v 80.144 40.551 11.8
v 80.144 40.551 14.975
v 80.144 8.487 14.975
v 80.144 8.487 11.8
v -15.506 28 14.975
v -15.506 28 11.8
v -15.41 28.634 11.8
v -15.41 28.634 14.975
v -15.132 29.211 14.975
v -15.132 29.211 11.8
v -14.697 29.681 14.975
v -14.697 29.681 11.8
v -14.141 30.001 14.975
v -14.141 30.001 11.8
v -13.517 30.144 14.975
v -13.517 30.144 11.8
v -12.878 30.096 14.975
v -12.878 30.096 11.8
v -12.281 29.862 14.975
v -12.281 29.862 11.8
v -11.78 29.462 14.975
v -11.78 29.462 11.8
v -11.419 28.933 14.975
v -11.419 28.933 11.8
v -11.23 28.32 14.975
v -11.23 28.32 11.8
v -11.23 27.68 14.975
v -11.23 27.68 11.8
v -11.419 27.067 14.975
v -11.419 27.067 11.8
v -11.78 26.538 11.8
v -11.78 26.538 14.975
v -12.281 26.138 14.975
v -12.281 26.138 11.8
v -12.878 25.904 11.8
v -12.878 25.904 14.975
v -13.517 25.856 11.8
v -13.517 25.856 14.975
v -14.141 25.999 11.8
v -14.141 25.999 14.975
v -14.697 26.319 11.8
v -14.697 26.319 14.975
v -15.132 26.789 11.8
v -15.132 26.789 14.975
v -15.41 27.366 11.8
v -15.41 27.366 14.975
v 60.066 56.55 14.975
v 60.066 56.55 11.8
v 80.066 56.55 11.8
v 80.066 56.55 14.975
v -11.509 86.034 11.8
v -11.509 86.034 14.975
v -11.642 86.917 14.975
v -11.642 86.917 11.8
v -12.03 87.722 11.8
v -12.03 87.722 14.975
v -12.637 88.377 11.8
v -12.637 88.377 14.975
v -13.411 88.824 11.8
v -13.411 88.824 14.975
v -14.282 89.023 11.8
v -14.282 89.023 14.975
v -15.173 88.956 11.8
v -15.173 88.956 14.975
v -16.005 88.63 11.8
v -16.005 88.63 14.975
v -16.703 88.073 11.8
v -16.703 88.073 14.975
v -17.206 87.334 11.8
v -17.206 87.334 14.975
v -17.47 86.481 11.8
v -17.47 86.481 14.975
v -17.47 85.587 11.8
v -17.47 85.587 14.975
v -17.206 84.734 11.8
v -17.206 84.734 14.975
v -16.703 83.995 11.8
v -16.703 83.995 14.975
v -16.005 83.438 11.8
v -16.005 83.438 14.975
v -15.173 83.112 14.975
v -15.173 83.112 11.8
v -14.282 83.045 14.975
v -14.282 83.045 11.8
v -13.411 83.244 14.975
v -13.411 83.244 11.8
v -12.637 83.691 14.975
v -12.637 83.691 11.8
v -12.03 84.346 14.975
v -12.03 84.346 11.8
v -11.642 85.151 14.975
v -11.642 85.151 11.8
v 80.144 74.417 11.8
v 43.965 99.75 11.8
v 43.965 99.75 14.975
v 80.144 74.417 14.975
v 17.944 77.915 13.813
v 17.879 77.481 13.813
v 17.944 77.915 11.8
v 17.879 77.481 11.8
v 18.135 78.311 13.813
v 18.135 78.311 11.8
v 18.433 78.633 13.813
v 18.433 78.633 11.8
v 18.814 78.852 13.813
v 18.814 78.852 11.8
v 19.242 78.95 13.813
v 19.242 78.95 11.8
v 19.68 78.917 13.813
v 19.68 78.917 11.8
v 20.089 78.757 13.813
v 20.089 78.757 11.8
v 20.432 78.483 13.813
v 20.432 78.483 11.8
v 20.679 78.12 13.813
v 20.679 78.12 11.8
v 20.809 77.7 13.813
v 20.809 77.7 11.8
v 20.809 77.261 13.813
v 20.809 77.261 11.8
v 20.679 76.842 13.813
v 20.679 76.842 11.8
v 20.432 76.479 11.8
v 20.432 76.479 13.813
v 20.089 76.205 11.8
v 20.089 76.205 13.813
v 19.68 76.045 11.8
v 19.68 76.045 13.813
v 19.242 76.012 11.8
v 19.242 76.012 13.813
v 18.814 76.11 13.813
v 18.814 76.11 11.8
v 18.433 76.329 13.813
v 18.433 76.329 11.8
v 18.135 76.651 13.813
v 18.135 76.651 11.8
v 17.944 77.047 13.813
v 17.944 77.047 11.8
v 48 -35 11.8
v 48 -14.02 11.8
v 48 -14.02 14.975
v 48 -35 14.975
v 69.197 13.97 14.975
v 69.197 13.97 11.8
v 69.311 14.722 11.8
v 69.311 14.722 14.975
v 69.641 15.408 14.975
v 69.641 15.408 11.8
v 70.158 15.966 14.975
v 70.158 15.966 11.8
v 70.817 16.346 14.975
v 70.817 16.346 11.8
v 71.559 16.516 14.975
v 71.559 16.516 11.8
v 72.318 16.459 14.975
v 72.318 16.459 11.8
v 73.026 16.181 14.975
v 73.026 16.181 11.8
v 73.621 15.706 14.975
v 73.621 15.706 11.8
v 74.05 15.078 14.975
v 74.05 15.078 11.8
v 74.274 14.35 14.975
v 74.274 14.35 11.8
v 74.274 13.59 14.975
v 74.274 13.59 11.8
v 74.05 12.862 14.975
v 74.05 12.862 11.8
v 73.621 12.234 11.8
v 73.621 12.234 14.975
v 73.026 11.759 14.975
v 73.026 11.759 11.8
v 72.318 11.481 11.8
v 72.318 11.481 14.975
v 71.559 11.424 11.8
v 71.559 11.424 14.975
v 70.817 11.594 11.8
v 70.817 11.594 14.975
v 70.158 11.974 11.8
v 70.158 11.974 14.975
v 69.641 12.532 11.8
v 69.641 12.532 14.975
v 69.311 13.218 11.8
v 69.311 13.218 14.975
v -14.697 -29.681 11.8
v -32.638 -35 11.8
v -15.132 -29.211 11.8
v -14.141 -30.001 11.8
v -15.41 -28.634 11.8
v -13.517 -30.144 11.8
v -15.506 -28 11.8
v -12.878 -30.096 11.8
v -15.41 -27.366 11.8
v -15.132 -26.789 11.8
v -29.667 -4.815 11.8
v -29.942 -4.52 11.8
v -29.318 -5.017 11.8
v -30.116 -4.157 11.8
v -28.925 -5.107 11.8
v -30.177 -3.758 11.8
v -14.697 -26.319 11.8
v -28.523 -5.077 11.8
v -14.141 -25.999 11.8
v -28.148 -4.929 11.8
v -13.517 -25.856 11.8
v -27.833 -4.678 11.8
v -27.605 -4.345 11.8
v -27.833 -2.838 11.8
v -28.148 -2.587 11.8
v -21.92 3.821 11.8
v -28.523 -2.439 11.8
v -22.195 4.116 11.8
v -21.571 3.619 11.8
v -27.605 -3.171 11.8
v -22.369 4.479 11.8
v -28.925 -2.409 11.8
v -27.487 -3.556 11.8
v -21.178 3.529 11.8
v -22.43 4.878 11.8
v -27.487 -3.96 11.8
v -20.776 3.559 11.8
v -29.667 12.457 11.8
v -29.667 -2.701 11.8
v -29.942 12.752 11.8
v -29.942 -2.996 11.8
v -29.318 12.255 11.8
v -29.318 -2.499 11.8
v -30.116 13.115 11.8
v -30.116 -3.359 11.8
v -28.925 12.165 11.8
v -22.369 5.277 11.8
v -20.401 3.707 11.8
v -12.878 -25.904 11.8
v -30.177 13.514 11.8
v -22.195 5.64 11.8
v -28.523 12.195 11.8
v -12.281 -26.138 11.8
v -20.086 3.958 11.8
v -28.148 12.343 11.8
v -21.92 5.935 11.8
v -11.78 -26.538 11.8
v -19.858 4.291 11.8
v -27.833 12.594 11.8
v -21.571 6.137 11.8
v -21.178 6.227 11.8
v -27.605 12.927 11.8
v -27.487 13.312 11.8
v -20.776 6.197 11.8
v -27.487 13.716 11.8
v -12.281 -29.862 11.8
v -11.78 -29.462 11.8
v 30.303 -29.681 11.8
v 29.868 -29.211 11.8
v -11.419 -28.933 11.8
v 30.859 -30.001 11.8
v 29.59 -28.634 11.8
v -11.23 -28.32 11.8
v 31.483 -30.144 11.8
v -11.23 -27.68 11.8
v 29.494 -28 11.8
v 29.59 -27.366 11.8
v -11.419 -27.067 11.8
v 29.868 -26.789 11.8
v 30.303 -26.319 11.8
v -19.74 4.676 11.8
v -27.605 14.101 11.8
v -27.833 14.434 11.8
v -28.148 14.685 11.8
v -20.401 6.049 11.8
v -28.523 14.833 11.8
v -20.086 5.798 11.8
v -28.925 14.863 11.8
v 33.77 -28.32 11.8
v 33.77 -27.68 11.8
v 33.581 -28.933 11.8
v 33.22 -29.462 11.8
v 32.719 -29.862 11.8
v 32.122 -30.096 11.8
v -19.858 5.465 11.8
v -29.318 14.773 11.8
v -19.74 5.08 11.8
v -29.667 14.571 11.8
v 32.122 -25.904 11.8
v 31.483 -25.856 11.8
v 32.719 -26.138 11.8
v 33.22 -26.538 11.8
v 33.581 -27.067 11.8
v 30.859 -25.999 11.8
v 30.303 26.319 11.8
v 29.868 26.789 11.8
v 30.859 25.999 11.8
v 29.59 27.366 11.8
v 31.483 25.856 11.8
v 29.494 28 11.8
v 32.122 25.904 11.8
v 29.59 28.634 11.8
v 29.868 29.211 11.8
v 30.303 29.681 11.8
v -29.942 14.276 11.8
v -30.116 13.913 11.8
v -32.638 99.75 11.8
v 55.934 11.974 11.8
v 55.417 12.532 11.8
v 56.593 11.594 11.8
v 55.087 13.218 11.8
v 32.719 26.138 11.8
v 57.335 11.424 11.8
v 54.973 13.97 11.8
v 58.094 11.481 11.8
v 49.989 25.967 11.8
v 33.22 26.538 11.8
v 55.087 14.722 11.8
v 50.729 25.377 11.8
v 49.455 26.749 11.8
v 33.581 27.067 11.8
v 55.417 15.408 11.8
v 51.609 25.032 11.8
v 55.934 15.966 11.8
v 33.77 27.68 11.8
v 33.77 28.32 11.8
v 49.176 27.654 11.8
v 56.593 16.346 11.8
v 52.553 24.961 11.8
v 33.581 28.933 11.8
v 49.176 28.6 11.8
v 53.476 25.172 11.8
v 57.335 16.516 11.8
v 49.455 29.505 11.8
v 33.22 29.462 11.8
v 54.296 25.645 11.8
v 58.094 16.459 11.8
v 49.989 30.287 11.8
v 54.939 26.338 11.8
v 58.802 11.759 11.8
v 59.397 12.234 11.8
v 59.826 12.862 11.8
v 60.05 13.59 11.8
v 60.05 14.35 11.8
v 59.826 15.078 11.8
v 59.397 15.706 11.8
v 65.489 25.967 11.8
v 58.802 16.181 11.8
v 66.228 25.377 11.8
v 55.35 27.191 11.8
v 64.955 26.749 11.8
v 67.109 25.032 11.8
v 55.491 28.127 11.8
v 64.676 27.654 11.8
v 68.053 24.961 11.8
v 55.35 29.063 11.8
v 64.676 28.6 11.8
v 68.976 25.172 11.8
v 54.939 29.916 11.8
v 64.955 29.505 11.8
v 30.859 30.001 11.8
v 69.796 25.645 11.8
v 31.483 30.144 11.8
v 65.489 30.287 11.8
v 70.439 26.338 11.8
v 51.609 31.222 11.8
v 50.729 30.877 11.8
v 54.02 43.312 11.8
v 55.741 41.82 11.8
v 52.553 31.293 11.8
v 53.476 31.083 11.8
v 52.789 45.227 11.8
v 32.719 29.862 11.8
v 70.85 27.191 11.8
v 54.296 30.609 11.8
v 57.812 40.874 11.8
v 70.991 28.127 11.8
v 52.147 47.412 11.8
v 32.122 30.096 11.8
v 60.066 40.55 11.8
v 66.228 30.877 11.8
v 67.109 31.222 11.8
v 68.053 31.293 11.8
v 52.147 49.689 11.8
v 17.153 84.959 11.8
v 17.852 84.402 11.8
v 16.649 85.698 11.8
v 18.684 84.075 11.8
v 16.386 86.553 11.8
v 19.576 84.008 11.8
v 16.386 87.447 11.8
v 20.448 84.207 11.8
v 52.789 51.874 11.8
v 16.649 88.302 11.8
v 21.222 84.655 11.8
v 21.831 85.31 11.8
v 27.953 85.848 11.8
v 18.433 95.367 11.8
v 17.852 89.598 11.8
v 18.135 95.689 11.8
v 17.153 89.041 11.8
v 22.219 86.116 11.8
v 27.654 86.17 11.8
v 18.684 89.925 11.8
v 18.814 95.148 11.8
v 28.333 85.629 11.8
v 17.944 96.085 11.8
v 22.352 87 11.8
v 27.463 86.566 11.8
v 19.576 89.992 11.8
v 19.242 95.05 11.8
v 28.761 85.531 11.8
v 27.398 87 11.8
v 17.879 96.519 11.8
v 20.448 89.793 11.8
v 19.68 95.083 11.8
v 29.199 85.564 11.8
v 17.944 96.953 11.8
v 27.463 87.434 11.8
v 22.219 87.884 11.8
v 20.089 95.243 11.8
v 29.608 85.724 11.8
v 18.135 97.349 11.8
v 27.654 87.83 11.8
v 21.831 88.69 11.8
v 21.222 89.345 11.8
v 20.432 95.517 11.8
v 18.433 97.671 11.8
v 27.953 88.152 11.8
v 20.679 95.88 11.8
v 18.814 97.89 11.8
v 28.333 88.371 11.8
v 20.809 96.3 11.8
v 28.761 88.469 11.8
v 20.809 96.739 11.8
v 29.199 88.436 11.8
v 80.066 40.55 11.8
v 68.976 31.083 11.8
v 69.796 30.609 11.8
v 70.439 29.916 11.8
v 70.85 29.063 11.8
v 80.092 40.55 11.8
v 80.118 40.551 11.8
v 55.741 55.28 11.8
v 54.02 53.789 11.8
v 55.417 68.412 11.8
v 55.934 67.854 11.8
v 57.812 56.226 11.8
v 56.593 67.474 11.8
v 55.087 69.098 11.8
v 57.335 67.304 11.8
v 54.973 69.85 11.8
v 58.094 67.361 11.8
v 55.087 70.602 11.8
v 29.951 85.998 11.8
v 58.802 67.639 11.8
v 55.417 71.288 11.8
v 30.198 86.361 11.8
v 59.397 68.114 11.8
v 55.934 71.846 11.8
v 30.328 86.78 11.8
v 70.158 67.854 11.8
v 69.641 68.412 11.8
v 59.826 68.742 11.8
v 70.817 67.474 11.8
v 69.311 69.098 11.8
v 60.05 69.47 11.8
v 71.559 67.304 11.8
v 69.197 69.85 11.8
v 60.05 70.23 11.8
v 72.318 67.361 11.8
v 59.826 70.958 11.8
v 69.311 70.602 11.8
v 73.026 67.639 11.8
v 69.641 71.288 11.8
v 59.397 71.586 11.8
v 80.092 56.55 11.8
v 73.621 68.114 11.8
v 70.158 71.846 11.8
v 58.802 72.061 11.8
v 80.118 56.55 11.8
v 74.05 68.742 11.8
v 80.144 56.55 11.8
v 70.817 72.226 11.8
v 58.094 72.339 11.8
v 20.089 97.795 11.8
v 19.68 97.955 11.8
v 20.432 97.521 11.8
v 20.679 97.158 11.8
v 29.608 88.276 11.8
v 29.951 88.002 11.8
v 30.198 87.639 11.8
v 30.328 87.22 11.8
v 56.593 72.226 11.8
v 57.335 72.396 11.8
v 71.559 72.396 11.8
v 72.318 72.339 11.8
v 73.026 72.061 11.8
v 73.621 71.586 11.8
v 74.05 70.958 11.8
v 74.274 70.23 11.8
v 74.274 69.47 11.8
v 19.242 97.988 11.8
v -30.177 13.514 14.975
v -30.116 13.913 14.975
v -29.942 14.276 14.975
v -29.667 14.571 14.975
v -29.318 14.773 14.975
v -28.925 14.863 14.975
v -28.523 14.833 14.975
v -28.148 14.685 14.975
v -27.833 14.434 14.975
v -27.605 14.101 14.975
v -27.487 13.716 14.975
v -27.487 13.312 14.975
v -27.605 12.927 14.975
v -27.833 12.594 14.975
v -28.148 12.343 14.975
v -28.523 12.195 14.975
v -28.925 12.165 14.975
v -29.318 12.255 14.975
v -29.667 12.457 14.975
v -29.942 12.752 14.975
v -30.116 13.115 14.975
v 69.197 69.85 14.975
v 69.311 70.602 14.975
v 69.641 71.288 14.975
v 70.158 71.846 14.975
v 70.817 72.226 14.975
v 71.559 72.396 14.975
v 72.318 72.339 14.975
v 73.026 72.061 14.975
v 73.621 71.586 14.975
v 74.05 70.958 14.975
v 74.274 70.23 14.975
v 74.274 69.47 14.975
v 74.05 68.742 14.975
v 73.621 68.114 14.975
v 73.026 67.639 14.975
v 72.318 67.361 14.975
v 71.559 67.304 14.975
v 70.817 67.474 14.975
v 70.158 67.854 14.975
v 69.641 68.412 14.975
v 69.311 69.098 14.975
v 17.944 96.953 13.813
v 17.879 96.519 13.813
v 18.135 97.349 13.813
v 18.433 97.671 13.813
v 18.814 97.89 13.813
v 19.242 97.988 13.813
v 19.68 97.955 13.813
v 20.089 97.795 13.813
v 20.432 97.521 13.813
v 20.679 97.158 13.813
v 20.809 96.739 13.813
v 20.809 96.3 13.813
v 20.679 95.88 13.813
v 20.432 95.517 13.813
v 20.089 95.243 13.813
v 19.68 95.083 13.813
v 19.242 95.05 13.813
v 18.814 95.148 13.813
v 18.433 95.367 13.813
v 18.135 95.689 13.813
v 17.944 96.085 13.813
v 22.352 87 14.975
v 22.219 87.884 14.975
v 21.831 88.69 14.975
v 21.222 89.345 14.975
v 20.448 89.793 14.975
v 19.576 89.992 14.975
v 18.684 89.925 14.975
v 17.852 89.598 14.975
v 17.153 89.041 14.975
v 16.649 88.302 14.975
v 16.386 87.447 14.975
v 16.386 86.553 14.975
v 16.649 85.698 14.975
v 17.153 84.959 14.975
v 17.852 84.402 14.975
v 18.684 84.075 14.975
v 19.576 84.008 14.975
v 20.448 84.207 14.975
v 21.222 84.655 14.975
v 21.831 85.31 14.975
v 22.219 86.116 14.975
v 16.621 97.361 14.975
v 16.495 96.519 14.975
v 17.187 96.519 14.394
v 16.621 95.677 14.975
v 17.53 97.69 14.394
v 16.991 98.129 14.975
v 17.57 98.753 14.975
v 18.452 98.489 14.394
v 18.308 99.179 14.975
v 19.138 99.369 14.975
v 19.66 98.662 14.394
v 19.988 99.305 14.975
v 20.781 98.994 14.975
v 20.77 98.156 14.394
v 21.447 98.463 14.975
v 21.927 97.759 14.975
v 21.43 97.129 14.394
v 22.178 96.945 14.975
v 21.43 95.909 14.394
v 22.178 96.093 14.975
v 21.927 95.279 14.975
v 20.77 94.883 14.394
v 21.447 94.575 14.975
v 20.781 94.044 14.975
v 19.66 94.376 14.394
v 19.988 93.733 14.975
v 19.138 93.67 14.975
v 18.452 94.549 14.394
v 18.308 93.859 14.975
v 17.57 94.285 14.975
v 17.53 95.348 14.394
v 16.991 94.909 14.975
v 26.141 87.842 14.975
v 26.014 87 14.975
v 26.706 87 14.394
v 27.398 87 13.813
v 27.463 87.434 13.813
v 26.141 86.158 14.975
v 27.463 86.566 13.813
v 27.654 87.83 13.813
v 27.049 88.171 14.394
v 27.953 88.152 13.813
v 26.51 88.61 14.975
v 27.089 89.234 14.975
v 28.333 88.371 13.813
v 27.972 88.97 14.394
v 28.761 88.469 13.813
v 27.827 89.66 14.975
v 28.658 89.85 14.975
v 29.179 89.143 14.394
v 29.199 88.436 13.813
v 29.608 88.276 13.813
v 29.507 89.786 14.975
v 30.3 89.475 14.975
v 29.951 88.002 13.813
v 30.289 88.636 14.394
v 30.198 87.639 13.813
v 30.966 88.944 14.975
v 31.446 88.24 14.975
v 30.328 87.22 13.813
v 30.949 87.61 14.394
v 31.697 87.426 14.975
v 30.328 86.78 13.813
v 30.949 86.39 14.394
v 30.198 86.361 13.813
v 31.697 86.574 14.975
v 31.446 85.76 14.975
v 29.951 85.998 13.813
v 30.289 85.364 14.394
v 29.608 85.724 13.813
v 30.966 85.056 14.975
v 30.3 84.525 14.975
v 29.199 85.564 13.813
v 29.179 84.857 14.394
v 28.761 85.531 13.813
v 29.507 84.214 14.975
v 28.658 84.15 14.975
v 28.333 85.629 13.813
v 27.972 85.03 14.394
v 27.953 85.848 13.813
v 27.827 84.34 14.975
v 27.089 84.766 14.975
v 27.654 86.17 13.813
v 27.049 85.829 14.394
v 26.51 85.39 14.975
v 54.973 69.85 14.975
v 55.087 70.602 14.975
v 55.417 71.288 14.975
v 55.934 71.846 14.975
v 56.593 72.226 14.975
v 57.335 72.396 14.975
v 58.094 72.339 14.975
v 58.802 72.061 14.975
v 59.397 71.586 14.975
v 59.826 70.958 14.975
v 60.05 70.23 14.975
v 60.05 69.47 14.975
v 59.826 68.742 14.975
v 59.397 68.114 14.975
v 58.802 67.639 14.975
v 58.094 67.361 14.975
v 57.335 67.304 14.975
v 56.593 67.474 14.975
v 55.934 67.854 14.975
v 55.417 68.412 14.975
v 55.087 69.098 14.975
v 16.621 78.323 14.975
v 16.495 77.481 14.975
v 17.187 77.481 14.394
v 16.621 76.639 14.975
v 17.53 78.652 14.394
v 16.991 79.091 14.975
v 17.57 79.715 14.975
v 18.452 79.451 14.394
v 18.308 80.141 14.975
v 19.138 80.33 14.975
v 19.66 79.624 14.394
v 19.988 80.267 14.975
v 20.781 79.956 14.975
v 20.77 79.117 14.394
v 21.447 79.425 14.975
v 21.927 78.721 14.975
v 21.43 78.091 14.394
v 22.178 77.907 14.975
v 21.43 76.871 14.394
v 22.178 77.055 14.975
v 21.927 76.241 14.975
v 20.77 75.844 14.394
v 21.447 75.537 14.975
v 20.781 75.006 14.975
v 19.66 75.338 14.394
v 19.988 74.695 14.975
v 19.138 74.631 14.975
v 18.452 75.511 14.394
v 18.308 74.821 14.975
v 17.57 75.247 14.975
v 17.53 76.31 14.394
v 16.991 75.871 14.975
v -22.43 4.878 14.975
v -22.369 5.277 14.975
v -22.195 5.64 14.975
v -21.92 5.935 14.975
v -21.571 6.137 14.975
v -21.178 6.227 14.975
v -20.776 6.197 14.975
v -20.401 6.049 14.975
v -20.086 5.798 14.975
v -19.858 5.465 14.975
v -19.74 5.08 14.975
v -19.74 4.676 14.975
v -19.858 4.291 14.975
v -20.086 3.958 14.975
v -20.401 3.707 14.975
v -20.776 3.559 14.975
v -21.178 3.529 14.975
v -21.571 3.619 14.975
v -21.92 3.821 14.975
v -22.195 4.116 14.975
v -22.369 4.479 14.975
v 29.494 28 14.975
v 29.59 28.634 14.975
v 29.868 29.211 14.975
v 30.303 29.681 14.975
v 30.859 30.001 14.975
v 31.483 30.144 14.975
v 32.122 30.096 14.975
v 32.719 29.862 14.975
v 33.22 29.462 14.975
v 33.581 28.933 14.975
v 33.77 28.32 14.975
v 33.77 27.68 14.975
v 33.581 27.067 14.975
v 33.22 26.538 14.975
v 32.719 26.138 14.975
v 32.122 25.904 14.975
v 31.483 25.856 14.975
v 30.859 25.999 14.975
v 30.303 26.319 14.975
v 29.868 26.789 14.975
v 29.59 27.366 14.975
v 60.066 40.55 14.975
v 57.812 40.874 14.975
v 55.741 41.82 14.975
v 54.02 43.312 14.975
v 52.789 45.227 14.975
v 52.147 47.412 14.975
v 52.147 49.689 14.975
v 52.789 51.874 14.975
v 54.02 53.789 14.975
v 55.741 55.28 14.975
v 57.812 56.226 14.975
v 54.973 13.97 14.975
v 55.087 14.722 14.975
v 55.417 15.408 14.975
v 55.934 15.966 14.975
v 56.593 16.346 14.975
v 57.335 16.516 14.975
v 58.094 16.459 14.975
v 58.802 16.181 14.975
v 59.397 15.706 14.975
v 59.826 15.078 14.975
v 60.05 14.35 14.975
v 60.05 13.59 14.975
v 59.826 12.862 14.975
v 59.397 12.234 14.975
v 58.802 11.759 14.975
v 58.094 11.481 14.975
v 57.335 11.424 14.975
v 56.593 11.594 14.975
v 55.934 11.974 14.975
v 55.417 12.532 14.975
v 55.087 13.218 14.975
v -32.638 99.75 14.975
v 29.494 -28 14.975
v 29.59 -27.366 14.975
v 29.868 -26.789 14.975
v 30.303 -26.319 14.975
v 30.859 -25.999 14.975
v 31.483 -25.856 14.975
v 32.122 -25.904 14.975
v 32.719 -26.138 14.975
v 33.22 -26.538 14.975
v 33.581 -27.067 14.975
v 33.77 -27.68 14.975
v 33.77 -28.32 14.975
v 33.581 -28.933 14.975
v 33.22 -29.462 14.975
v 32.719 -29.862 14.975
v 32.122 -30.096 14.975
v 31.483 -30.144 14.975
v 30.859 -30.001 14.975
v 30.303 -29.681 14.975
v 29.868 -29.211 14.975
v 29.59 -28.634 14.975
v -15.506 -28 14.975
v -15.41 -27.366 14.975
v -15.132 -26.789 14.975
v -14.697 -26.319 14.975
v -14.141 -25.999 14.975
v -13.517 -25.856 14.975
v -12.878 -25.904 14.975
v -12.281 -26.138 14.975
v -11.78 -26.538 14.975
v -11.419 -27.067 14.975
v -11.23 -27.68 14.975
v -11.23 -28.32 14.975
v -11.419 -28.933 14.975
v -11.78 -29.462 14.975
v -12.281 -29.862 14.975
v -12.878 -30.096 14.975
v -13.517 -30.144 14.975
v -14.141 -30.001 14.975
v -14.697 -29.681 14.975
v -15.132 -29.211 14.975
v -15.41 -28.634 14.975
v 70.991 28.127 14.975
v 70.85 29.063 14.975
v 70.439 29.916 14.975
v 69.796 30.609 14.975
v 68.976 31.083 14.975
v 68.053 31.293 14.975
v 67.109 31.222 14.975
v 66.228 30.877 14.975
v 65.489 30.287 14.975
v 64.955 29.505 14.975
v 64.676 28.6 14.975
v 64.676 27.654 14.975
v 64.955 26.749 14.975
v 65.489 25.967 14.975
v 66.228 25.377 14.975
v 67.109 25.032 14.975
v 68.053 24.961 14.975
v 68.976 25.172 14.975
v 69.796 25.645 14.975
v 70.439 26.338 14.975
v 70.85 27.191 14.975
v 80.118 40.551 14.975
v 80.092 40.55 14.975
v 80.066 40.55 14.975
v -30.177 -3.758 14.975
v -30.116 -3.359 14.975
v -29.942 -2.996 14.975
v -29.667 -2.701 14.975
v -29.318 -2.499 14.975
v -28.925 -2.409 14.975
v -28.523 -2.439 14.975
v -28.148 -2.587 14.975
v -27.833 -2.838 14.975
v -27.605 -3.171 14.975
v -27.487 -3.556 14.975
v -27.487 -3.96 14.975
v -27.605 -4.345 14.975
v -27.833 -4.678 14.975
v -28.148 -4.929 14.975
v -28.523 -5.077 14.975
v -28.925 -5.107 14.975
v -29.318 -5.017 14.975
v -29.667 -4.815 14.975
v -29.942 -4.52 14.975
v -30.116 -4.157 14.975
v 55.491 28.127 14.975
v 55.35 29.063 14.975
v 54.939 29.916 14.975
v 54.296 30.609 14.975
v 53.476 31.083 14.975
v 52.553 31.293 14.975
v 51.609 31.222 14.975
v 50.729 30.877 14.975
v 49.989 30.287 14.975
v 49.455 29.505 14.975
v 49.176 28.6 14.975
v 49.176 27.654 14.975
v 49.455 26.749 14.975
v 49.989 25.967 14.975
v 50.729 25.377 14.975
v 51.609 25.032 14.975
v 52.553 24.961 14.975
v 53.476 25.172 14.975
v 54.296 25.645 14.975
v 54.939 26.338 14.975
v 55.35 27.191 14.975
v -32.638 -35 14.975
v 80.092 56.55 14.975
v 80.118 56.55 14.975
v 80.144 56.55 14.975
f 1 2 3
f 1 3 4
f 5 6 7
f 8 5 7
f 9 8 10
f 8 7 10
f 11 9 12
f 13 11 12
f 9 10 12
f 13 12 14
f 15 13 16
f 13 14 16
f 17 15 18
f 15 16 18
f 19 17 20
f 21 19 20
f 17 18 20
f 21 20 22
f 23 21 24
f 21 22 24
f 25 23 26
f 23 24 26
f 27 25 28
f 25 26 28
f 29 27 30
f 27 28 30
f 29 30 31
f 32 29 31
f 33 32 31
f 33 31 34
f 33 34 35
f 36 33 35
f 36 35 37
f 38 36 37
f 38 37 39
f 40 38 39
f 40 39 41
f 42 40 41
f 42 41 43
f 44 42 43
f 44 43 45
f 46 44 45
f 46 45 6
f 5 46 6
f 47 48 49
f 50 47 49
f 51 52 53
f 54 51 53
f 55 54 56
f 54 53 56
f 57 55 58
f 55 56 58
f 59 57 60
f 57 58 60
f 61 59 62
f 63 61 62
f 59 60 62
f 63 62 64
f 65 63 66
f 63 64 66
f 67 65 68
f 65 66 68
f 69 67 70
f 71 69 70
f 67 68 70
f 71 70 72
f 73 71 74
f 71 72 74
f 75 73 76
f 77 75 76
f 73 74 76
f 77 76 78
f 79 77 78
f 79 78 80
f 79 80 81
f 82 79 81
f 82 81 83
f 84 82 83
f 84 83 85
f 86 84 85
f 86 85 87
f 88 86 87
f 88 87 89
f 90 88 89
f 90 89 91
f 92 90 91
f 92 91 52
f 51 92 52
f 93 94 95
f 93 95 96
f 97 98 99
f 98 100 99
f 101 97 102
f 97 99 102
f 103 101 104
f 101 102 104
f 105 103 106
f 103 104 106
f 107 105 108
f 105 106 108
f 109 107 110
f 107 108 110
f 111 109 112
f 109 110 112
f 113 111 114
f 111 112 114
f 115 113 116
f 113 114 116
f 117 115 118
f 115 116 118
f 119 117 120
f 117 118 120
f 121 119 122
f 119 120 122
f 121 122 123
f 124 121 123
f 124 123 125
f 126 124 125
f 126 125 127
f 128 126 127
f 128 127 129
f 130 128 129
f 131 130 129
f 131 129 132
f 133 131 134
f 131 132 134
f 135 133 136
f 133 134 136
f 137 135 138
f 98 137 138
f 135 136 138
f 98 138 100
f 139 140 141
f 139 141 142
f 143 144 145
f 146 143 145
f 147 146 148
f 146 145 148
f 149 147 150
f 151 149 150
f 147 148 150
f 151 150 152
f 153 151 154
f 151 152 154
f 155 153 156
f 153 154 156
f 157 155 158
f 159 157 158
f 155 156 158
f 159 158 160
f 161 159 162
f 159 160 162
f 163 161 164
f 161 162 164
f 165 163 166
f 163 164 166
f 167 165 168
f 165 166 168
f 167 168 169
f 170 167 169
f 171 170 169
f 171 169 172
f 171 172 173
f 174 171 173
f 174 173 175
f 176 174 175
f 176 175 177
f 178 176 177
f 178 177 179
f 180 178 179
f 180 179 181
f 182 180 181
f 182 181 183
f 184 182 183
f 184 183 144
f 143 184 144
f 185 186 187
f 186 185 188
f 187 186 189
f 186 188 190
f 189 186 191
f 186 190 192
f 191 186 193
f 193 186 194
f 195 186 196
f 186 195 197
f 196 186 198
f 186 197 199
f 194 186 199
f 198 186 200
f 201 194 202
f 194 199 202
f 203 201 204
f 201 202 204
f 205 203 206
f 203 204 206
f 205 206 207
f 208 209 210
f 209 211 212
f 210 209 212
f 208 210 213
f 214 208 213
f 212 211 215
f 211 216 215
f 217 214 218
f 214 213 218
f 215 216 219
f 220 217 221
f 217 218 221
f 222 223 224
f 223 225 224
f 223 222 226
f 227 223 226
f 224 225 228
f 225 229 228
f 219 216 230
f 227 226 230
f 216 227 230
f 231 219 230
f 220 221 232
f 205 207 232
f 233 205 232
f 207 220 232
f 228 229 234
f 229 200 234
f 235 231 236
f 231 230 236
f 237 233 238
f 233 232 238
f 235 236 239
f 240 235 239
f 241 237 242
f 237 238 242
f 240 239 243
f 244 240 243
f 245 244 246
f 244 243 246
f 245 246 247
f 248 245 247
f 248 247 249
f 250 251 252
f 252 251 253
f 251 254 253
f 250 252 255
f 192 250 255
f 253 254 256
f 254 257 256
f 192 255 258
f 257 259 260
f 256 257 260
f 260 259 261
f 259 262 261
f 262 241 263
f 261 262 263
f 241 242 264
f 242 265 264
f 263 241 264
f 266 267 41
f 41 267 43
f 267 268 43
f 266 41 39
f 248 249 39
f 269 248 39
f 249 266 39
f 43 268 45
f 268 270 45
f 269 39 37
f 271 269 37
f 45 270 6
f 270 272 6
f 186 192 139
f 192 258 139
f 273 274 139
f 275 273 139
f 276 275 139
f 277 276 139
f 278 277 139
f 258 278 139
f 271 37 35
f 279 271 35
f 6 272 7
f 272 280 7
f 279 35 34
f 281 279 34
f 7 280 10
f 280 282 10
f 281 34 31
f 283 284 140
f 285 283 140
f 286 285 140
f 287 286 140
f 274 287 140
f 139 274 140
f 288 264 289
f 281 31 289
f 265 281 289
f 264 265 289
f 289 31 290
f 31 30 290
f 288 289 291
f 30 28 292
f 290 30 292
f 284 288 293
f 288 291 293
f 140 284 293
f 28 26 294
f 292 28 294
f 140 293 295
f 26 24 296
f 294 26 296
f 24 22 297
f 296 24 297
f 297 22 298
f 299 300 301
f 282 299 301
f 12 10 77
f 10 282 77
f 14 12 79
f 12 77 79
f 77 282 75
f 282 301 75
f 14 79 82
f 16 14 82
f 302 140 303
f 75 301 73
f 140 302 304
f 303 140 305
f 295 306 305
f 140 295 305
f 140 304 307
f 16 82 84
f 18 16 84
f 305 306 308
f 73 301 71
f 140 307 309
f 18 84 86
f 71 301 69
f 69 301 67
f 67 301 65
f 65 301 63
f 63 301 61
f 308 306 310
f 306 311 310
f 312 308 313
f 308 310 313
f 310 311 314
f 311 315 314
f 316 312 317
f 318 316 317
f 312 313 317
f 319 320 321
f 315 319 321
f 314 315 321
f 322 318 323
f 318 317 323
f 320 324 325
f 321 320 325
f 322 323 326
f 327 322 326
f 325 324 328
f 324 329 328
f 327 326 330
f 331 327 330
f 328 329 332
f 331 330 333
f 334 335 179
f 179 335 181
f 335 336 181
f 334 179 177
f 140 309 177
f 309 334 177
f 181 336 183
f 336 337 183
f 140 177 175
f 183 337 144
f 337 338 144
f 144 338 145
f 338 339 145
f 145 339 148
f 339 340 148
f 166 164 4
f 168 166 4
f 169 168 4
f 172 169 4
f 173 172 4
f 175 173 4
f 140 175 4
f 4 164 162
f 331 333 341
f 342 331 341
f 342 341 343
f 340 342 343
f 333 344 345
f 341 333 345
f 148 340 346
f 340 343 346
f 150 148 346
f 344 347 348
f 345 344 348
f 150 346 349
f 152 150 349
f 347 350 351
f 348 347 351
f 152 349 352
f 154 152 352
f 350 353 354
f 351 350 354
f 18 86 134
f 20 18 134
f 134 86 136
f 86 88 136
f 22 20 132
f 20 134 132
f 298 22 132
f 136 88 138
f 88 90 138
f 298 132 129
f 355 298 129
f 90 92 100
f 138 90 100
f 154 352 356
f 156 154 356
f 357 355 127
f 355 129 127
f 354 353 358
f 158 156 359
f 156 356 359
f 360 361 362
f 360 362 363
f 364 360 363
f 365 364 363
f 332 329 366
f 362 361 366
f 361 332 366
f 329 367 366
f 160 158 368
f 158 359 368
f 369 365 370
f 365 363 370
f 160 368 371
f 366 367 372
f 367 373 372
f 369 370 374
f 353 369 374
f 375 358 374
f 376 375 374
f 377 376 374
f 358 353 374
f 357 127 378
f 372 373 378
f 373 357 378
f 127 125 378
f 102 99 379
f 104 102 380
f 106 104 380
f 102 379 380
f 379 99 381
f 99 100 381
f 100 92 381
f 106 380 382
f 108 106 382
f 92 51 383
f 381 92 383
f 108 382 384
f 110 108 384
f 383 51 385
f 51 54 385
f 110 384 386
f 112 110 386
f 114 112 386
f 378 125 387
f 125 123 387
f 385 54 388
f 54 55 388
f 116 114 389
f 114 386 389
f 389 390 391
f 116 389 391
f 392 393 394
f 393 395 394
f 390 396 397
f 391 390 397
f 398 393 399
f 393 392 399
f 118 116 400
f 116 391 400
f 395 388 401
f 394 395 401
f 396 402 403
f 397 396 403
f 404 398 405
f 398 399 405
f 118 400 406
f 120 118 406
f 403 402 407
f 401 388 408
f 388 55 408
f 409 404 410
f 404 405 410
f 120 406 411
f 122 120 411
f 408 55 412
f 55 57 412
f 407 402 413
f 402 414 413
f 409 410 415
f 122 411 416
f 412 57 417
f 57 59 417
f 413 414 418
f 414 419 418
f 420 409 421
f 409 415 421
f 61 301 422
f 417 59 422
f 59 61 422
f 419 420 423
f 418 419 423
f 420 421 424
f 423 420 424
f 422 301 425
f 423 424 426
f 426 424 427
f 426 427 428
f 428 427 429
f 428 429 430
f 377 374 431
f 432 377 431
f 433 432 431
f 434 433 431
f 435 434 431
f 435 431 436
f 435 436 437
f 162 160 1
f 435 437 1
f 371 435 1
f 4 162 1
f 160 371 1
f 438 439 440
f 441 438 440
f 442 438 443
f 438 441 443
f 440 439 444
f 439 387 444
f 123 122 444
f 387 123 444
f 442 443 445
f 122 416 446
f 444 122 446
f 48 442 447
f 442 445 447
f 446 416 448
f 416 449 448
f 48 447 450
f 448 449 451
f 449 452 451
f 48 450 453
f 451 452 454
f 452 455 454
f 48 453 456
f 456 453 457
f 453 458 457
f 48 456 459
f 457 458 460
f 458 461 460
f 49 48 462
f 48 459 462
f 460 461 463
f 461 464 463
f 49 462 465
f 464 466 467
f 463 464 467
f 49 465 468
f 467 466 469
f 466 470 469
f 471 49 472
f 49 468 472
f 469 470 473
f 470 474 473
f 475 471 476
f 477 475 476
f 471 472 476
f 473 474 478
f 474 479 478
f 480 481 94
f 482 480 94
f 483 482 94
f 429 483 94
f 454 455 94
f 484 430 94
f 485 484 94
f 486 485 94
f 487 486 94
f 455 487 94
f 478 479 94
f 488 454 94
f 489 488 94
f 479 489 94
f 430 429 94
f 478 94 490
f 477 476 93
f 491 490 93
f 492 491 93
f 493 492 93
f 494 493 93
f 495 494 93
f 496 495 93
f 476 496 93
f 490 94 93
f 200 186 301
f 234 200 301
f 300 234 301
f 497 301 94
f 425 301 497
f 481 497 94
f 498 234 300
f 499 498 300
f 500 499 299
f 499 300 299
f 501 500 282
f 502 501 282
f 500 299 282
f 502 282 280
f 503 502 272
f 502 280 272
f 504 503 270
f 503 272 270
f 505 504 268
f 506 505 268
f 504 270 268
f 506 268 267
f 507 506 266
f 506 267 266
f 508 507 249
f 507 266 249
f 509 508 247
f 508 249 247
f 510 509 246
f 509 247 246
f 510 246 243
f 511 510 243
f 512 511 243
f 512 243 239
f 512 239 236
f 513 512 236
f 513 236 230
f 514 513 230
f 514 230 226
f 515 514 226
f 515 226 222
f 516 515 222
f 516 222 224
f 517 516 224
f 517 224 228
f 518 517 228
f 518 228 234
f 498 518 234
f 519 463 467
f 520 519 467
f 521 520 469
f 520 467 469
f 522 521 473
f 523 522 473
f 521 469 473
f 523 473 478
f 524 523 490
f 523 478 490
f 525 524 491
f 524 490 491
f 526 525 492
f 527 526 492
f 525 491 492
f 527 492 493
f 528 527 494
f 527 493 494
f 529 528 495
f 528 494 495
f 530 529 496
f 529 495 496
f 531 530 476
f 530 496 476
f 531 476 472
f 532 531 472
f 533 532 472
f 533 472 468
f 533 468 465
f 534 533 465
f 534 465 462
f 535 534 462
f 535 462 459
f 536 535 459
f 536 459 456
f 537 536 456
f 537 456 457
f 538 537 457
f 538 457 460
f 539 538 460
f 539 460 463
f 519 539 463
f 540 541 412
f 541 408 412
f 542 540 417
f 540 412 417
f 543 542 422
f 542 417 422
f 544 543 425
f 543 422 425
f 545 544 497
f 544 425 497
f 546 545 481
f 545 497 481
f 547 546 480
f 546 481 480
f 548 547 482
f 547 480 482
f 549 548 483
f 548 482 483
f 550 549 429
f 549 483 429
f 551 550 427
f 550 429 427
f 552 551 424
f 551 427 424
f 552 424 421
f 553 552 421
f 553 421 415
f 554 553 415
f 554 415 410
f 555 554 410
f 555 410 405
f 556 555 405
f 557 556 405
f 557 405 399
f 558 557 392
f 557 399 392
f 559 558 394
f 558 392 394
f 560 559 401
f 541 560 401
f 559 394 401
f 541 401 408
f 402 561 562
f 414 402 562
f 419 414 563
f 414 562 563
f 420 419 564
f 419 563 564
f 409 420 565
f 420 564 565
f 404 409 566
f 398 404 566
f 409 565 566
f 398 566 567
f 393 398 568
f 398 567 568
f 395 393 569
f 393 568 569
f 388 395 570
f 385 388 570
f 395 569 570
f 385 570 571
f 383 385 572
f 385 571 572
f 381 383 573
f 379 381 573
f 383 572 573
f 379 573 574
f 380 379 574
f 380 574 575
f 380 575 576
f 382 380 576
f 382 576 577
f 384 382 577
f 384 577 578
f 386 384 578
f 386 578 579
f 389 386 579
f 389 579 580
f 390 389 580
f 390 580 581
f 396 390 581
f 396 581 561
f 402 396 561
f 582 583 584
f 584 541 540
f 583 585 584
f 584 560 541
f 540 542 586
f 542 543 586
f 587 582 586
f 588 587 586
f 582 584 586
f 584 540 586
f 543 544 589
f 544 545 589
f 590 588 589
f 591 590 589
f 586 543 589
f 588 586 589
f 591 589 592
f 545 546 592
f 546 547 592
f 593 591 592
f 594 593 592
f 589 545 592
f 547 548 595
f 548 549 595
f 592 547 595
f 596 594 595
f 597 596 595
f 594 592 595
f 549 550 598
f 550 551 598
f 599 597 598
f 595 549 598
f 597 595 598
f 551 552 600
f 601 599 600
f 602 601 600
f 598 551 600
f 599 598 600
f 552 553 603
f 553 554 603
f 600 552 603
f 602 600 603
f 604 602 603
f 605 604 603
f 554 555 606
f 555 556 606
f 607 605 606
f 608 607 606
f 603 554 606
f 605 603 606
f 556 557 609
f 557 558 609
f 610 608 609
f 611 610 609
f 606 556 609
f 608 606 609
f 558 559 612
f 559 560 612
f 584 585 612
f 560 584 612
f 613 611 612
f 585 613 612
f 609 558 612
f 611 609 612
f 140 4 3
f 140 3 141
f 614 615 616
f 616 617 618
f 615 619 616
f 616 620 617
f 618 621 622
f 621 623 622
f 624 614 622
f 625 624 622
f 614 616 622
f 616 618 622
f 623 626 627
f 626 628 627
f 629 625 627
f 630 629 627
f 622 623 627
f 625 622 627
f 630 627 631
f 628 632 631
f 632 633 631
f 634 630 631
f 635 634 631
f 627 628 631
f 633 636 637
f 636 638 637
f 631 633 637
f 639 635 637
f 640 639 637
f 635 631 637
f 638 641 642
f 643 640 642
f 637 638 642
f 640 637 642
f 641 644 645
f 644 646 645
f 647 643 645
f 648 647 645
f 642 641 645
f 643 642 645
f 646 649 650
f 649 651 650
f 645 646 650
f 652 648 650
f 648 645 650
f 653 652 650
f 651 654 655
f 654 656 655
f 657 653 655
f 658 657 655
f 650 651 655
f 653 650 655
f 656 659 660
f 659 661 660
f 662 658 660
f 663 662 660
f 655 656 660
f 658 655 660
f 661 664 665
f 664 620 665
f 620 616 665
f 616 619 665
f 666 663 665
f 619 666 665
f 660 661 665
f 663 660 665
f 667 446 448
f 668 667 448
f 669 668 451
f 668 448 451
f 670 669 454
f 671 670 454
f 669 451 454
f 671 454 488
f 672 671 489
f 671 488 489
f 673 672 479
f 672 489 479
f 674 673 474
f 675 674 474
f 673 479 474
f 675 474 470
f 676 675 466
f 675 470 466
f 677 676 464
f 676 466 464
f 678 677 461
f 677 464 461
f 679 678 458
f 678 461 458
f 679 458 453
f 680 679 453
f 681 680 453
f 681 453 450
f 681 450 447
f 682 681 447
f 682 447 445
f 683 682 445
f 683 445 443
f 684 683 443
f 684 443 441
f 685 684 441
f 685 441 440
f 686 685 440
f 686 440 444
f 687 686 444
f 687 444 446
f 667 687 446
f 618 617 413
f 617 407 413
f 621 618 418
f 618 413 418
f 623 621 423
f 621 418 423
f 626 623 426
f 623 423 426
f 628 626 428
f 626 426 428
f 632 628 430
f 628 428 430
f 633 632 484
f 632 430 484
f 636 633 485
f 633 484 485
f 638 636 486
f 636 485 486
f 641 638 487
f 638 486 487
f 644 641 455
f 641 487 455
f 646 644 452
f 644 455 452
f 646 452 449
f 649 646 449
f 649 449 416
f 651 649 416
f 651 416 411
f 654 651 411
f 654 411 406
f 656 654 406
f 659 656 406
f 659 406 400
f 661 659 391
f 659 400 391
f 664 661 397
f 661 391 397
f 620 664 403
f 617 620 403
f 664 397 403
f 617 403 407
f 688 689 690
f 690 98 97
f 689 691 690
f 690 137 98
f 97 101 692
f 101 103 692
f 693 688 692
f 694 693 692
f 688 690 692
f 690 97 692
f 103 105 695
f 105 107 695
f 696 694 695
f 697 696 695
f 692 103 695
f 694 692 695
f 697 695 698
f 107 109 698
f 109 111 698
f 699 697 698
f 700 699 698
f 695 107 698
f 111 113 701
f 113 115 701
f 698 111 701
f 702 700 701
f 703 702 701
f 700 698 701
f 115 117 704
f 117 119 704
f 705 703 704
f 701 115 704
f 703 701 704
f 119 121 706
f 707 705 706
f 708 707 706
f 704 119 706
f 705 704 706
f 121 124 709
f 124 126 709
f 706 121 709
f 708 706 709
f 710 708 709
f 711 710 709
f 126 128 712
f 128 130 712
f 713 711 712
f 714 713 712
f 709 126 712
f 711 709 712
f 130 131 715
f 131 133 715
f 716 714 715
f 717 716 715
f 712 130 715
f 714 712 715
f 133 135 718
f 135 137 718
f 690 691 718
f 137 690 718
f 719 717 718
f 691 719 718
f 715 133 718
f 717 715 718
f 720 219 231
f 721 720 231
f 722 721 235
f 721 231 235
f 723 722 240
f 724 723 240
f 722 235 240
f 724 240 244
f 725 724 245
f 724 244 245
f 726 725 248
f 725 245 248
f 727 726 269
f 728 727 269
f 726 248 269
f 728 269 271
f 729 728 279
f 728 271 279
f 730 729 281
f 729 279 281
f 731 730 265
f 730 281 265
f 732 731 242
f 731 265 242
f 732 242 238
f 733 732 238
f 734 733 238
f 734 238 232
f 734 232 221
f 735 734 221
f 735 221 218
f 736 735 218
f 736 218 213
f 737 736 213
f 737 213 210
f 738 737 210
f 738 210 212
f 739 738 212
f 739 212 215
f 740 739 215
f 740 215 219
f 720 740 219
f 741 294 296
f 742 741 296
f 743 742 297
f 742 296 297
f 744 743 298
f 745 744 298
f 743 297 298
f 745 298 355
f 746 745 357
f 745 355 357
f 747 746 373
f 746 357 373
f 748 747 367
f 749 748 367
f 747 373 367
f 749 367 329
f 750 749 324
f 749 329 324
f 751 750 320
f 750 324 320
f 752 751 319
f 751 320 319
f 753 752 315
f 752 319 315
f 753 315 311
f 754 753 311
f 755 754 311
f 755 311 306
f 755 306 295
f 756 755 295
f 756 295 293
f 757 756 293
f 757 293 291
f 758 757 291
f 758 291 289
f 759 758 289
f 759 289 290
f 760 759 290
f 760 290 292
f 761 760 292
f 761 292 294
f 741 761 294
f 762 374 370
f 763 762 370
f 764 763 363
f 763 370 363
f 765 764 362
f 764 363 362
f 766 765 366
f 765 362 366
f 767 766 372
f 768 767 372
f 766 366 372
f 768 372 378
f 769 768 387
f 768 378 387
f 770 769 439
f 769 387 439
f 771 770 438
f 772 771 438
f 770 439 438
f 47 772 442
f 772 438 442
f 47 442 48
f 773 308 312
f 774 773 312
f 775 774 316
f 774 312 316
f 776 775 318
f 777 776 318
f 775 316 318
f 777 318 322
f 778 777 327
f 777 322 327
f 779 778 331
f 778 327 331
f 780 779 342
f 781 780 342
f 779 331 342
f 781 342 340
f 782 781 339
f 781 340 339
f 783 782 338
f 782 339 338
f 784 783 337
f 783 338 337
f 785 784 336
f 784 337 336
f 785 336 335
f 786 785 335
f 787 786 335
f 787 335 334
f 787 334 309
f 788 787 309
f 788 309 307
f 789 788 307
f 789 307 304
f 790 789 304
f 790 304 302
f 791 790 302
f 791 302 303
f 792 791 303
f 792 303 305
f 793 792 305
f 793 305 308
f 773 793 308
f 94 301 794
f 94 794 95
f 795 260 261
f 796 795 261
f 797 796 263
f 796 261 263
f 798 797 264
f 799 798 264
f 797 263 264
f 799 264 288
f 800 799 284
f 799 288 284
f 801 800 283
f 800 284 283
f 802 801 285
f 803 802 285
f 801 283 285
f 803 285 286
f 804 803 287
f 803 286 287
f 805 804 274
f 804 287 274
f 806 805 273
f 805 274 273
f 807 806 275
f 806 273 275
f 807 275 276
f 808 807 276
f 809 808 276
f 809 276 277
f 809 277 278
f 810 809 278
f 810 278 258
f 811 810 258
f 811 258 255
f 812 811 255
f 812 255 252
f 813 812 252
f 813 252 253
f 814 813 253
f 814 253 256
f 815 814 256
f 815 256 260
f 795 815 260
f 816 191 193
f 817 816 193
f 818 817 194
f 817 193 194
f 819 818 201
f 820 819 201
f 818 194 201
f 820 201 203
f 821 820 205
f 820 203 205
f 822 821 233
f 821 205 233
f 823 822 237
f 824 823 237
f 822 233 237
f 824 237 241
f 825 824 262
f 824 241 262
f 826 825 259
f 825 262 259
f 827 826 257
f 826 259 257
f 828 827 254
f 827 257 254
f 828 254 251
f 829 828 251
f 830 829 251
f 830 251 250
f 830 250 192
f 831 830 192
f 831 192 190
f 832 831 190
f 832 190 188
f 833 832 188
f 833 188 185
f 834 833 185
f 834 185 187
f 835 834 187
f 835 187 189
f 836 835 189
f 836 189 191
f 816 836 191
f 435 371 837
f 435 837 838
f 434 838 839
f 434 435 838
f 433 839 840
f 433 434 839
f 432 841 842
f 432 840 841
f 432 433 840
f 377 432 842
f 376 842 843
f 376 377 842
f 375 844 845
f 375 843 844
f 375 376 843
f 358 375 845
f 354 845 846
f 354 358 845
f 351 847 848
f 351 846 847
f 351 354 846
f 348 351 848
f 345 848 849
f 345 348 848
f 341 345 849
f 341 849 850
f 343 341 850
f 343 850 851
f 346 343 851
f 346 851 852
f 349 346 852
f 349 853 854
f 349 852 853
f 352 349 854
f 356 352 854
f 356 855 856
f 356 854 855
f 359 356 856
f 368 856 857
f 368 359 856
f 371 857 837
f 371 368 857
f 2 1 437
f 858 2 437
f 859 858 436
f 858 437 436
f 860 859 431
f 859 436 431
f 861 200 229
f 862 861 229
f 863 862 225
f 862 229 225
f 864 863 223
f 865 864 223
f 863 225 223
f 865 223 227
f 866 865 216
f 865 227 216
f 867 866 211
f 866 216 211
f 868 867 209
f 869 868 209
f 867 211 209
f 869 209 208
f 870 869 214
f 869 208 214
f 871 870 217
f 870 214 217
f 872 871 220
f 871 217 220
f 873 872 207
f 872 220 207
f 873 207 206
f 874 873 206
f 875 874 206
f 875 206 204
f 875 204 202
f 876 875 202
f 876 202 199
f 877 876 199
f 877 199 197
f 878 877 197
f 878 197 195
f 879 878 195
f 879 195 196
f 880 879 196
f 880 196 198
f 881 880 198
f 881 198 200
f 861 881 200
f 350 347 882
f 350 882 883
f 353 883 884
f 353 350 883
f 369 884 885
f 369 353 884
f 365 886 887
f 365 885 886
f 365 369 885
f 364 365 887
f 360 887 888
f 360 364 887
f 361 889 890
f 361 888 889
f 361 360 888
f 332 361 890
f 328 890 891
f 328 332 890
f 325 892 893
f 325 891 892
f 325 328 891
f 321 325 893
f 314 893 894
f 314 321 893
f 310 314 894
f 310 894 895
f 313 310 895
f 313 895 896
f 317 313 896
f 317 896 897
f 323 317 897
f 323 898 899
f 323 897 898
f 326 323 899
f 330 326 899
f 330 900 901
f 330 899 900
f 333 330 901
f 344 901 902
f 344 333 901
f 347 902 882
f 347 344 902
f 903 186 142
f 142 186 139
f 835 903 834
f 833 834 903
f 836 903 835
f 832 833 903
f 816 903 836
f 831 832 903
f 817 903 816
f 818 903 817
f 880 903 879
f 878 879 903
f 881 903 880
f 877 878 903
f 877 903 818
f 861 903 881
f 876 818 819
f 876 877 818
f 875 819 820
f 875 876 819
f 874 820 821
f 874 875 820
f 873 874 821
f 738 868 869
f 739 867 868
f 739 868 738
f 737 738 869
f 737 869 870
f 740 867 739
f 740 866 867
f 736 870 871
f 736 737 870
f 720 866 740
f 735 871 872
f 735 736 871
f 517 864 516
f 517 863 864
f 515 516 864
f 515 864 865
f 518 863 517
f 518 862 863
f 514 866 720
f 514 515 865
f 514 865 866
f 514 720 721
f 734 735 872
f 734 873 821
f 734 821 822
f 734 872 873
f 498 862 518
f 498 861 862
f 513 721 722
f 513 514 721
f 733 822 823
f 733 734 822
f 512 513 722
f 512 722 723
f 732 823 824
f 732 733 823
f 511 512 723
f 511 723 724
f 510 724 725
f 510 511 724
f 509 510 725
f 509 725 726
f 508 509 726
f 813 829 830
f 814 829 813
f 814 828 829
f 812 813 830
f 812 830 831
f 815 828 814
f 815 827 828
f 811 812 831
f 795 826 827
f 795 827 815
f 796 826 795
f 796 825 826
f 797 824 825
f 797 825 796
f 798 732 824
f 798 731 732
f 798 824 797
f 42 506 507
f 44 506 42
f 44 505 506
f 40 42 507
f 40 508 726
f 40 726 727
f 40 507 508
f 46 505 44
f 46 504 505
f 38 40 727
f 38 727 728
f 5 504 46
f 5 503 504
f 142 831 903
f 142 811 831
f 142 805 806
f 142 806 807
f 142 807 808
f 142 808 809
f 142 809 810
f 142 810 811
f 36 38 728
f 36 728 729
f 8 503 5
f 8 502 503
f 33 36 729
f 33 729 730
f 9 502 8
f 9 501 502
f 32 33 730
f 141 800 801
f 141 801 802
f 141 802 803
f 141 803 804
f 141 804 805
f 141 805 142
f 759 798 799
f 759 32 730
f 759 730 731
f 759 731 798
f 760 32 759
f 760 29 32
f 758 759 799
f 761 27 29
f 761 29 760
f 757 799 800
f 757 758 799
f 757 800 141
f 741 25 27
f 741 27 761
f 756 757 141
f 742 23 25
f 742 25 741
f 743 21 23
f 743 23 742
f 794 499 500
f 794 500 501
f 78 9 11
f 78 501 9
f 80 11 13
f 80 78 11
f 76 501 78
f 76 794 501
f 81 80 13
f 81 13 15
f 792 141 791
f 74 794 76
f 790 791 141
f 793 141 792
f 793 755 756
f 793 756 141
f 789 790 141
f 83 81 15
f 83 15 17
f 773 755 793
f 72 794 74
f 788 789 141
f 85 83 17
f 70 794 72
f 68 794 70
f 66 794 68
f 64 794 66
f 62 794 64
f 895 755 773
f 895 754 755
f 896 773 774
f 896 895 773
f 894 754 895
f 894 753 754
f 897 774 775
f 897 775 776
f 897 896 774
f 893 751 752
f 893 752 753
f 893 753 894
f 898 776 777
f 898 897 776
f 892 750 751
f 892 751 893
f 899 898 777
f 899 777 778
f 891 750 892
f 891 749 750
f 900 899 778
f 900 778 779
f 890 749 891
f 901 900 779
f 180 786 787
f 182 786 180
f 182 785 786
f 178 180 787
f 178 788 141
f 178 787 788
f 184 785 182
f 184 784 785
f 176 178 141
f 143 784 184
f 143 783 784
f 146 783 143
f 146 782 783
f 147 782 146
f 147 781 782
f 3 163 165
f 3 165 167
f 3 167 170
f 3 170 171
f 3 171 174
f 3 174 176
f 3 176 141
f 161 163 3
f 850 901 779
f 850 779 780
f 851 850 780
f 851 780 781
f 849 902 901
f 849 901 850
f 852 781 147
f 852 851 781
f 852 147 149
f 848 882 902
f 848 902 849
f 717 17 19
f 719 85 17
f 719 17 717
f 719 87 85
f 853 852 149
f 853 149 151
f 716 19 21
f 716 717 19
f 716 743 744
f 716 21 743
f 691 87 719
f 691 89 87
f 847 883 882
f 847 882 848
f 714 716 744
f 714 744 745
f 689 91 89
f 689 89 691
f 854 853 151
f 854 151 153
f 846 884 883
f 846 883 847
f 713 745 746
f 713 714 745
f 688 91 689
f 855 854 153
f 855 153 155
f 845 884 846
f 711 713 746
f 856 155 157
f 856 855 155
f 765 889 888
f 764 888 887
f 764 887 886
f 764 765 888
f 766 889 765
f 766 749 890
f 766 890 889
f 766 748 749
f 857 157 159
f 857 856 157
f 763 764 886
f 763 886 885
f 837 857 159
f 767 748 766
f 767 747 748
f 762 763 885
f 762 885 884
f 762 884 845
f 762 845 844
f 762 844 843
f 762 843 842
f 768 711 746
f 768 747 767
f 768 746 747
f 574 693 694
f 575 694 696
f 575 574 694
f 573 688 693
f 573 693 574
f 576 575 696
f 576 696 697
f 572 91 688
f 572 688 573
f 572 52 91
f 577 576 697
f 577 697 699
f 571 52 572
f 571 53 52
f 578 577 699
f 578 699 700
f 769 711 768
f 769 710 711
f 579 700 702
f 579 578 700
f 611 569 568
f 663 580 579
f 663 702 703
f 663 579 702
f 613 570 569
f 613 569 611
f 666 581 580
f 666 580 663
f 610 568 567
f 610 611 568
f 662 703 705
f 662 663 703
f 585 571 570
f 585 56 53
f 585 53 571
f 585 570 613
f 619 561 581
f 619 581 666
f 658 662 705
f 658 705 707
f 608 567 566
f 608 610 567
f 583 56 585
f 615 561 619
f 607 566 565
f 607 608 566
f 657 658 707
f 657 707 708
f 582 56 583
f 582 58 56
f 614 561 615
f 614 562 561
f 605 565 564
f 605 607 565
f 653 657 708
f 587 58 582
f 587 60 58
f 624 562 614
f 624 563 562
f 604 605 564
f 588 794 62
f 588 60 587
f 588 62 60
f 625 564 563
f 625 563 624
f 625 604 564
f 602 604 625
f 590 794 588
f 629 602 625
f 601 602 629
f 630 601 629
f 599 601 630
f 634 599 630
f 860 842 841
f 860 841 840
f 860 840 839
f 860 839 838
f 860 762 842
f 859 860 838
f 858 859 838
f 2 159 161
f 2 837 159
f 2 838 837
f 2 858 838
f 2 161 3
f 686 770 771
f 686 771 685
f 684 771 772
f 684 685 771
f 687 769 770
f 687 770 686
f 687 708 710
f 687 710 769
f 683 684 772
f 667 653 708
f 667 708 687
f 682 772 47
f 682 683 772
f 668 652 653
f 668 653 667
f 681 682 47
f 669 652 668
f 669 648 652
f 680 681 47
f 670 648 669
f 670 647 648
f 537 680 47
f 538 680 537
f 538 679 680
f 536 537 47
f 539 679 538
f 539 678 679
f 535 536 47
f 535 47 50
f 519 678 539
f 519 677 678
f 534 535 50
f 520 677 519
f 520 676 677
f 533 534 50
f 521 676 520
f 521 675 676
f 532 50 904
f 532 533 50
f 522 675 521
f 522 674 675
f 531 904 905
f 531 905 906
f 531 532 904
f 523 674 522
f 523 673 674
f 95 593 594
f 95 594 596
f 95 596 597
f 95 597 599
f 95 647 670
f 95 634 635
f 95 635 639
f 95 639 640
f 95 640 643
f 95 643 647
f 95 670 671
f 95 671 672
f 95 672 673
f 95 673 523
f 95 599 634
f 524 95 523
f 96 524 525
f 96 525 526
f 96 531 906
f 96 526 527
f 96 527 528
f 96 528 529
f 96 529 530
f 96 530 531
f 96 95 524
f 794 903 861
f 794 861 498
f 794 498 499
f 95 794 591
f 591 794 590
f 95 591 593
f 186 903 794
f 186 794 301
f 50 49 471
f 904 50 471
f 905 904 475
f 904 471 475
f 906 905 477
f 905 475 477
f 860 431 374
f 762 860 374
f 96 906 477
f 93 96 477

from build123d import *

# Parameters (mm, degrees)
SKETCH1_W                                         = 112.782
SKETCH1_H                                         = 3.175
BOSS_EXTRUDE1_DEPTH                               = 99.75
BOSS_EXTRUDE1_DEPTH_BACK                          = 35
SKETCH2_R                                         = 3.175
CUT_EXTRUDE1_DEPTH                                = 15.975
CUT_EXTRUDE1_DEPTH_BACK                           = 1
M4_CLEARANCE_HOLE1_D                              = 4.3
CSK_FOR_4_FLAT_HEAD_MACHINE_SCREW_100_D           = 2.9464
CSK_FOR_4_FLAT_HEAD_MACHINE_SCREW_100_CSINK_D     = 5.715
CSK_FOR_4_FLAT_HEAD_MACHINE_SCREW_100_CSINK_ANGLE = 100
SKETCH8_R                                         = 3
CUT_EXTRUDE3_DEPTH                                = 3.5
F_6_32_TAPPED_HOLE1_D                             = 2.7051
F_1_4_20_TAPPED_HOLE1_D                           = 5.1054
SKETCH16_R                                        = 2.9972
CUT_EXTRUDE4_DEPTH                                = 4.175


with BuildPart() as part:
    # Sketch1 → Boss-Extrude1 (new body, two sides)
    with BuildSketch(Plane(origin=(0, 0, 0), x_dir=(1, 0, 0), z_dir=(0, 1, 0))) as boss_extrude1_sk:
        with Locations((23.753, -13.3875)):
            Rectangle(SKETCH1_W, SKETCH1_H)
    extrude(amount=BOSS_EXTRUDE1_DEPTH)
    extrude(boss_extrude1_sk.sketch, amount=-BOSS_EXTRUDE1_DEPTH_BACK)

    # Sketch2 → Cut-Extrude1 (cut, two sides)
    with BuildSketch(Plane.XY) as cut_extrude1_sk:
        with Locations((52.316, 28.127026218)):
            Circle(SKETCH2_R)
        with Locations((67.816, 28.127026218)):
            Circle(SKETCH2_R)
        Polygon((48, -35), (80.144, -35), (80.144, 8.487287802), (48, -14.020183306), align=None)
        with BuildLine():
            Line((60.066, 56.550419976), (80.066, 56.550419976))
            ThreePointArc((80.066, 56.550419976), (88.066, 48.550419976), (80.066, 40.550419976))
            Line((80.066, 40.550419976), (60.066, 40.550419976))
            ThreePointArc((60.066, 40.550419976), (52.066, 48.550419976), (60.066, 56.550419976))
        make_face()
        Polygon((43.964687276, 99.75), (80.144, 74.416972504), (80.144, 99.75), align=None)
    extrude(amount=CUT_EXTRUDE1_DEPTH, mode=Mode.SUBTRACT)
    extrude(cut_extrude1_sk.sketch, amount=-CUT_EXTRUDE1_DEPTH_BACK, mode=Mode.SUBTRACT)

    # M4 Clearance Hole1 (through all)
    with Locations(Plane.XY.offset(14.975)):
        with Locations((-13.356, 28), (31.644, 28), (31.644, -28), (-13.356, -28)):
            Hole(M4_CLEARANCE_HOLE1_D / 2)

    # CSK for #4 Flat Head Machine Screw (100)1 (through all)
    with Locations(Plane.XY.offset(14.975)):
        with Locations((19.352, 96.519071488), (28.871071488, 87), (19.352, 77.480928512)):
            CounterSinkHole(CSK_FOR_4_FLAT_HEAD_MACHINE_SCREW_100_D / 2, CSK_FOR_4_FLAT_HEAD_MACHINE_SCREW_100_CSINK_D / 2, counter_sink_angle=CSK_FOR_4_FLAT_HEAD_MACHINE_SCREW_100_CSINK_ANGLE)

    # Sketch8 → Cut-Extrude3 (cut)
    with BuildSketch(Plane.XY.offset(14.975)):
        with Locations((19.352, 87)):
            Circle(SKETCH8_R)
    extrude(amount=-CUT_EXTRUDE3_DEPTH, mode=Mode.SUBTRACT)

    # #6-32 Tapped Hole1 (through all)
    with Locations(Plane.XY.offset(14.975)):
        with Locations((-28.824, -3.758), (-21.077, 4.878), (-28.824, 13.514)):
            Hole(F_6_32_TAPPED_HOLE1_D / 2)

    # 1/4-20 Tapped Hole1 (through all)
    with Locations(Plane.XY.offset(14.975)):
        with Locations((57.526, 13.97), (71.75, 13.97), (71.75, 69.85), (57.526, 69.85)):
            Hole(F_1_4_20_TAPPED_HOLE1_D / 2)

    # Sketch16 → Cut-Extrude4 (cut, through all)
    with BuildSketch(Plane.XY.offset(14.975)):
        with Locations((-14.5061, 86.034)):
            Circle(SKETCH16_R)
    extrude(amount=-CUT_EXTRUDE4_DEPTH, mode=Mode.SUBTRACT)


solid = part.part
